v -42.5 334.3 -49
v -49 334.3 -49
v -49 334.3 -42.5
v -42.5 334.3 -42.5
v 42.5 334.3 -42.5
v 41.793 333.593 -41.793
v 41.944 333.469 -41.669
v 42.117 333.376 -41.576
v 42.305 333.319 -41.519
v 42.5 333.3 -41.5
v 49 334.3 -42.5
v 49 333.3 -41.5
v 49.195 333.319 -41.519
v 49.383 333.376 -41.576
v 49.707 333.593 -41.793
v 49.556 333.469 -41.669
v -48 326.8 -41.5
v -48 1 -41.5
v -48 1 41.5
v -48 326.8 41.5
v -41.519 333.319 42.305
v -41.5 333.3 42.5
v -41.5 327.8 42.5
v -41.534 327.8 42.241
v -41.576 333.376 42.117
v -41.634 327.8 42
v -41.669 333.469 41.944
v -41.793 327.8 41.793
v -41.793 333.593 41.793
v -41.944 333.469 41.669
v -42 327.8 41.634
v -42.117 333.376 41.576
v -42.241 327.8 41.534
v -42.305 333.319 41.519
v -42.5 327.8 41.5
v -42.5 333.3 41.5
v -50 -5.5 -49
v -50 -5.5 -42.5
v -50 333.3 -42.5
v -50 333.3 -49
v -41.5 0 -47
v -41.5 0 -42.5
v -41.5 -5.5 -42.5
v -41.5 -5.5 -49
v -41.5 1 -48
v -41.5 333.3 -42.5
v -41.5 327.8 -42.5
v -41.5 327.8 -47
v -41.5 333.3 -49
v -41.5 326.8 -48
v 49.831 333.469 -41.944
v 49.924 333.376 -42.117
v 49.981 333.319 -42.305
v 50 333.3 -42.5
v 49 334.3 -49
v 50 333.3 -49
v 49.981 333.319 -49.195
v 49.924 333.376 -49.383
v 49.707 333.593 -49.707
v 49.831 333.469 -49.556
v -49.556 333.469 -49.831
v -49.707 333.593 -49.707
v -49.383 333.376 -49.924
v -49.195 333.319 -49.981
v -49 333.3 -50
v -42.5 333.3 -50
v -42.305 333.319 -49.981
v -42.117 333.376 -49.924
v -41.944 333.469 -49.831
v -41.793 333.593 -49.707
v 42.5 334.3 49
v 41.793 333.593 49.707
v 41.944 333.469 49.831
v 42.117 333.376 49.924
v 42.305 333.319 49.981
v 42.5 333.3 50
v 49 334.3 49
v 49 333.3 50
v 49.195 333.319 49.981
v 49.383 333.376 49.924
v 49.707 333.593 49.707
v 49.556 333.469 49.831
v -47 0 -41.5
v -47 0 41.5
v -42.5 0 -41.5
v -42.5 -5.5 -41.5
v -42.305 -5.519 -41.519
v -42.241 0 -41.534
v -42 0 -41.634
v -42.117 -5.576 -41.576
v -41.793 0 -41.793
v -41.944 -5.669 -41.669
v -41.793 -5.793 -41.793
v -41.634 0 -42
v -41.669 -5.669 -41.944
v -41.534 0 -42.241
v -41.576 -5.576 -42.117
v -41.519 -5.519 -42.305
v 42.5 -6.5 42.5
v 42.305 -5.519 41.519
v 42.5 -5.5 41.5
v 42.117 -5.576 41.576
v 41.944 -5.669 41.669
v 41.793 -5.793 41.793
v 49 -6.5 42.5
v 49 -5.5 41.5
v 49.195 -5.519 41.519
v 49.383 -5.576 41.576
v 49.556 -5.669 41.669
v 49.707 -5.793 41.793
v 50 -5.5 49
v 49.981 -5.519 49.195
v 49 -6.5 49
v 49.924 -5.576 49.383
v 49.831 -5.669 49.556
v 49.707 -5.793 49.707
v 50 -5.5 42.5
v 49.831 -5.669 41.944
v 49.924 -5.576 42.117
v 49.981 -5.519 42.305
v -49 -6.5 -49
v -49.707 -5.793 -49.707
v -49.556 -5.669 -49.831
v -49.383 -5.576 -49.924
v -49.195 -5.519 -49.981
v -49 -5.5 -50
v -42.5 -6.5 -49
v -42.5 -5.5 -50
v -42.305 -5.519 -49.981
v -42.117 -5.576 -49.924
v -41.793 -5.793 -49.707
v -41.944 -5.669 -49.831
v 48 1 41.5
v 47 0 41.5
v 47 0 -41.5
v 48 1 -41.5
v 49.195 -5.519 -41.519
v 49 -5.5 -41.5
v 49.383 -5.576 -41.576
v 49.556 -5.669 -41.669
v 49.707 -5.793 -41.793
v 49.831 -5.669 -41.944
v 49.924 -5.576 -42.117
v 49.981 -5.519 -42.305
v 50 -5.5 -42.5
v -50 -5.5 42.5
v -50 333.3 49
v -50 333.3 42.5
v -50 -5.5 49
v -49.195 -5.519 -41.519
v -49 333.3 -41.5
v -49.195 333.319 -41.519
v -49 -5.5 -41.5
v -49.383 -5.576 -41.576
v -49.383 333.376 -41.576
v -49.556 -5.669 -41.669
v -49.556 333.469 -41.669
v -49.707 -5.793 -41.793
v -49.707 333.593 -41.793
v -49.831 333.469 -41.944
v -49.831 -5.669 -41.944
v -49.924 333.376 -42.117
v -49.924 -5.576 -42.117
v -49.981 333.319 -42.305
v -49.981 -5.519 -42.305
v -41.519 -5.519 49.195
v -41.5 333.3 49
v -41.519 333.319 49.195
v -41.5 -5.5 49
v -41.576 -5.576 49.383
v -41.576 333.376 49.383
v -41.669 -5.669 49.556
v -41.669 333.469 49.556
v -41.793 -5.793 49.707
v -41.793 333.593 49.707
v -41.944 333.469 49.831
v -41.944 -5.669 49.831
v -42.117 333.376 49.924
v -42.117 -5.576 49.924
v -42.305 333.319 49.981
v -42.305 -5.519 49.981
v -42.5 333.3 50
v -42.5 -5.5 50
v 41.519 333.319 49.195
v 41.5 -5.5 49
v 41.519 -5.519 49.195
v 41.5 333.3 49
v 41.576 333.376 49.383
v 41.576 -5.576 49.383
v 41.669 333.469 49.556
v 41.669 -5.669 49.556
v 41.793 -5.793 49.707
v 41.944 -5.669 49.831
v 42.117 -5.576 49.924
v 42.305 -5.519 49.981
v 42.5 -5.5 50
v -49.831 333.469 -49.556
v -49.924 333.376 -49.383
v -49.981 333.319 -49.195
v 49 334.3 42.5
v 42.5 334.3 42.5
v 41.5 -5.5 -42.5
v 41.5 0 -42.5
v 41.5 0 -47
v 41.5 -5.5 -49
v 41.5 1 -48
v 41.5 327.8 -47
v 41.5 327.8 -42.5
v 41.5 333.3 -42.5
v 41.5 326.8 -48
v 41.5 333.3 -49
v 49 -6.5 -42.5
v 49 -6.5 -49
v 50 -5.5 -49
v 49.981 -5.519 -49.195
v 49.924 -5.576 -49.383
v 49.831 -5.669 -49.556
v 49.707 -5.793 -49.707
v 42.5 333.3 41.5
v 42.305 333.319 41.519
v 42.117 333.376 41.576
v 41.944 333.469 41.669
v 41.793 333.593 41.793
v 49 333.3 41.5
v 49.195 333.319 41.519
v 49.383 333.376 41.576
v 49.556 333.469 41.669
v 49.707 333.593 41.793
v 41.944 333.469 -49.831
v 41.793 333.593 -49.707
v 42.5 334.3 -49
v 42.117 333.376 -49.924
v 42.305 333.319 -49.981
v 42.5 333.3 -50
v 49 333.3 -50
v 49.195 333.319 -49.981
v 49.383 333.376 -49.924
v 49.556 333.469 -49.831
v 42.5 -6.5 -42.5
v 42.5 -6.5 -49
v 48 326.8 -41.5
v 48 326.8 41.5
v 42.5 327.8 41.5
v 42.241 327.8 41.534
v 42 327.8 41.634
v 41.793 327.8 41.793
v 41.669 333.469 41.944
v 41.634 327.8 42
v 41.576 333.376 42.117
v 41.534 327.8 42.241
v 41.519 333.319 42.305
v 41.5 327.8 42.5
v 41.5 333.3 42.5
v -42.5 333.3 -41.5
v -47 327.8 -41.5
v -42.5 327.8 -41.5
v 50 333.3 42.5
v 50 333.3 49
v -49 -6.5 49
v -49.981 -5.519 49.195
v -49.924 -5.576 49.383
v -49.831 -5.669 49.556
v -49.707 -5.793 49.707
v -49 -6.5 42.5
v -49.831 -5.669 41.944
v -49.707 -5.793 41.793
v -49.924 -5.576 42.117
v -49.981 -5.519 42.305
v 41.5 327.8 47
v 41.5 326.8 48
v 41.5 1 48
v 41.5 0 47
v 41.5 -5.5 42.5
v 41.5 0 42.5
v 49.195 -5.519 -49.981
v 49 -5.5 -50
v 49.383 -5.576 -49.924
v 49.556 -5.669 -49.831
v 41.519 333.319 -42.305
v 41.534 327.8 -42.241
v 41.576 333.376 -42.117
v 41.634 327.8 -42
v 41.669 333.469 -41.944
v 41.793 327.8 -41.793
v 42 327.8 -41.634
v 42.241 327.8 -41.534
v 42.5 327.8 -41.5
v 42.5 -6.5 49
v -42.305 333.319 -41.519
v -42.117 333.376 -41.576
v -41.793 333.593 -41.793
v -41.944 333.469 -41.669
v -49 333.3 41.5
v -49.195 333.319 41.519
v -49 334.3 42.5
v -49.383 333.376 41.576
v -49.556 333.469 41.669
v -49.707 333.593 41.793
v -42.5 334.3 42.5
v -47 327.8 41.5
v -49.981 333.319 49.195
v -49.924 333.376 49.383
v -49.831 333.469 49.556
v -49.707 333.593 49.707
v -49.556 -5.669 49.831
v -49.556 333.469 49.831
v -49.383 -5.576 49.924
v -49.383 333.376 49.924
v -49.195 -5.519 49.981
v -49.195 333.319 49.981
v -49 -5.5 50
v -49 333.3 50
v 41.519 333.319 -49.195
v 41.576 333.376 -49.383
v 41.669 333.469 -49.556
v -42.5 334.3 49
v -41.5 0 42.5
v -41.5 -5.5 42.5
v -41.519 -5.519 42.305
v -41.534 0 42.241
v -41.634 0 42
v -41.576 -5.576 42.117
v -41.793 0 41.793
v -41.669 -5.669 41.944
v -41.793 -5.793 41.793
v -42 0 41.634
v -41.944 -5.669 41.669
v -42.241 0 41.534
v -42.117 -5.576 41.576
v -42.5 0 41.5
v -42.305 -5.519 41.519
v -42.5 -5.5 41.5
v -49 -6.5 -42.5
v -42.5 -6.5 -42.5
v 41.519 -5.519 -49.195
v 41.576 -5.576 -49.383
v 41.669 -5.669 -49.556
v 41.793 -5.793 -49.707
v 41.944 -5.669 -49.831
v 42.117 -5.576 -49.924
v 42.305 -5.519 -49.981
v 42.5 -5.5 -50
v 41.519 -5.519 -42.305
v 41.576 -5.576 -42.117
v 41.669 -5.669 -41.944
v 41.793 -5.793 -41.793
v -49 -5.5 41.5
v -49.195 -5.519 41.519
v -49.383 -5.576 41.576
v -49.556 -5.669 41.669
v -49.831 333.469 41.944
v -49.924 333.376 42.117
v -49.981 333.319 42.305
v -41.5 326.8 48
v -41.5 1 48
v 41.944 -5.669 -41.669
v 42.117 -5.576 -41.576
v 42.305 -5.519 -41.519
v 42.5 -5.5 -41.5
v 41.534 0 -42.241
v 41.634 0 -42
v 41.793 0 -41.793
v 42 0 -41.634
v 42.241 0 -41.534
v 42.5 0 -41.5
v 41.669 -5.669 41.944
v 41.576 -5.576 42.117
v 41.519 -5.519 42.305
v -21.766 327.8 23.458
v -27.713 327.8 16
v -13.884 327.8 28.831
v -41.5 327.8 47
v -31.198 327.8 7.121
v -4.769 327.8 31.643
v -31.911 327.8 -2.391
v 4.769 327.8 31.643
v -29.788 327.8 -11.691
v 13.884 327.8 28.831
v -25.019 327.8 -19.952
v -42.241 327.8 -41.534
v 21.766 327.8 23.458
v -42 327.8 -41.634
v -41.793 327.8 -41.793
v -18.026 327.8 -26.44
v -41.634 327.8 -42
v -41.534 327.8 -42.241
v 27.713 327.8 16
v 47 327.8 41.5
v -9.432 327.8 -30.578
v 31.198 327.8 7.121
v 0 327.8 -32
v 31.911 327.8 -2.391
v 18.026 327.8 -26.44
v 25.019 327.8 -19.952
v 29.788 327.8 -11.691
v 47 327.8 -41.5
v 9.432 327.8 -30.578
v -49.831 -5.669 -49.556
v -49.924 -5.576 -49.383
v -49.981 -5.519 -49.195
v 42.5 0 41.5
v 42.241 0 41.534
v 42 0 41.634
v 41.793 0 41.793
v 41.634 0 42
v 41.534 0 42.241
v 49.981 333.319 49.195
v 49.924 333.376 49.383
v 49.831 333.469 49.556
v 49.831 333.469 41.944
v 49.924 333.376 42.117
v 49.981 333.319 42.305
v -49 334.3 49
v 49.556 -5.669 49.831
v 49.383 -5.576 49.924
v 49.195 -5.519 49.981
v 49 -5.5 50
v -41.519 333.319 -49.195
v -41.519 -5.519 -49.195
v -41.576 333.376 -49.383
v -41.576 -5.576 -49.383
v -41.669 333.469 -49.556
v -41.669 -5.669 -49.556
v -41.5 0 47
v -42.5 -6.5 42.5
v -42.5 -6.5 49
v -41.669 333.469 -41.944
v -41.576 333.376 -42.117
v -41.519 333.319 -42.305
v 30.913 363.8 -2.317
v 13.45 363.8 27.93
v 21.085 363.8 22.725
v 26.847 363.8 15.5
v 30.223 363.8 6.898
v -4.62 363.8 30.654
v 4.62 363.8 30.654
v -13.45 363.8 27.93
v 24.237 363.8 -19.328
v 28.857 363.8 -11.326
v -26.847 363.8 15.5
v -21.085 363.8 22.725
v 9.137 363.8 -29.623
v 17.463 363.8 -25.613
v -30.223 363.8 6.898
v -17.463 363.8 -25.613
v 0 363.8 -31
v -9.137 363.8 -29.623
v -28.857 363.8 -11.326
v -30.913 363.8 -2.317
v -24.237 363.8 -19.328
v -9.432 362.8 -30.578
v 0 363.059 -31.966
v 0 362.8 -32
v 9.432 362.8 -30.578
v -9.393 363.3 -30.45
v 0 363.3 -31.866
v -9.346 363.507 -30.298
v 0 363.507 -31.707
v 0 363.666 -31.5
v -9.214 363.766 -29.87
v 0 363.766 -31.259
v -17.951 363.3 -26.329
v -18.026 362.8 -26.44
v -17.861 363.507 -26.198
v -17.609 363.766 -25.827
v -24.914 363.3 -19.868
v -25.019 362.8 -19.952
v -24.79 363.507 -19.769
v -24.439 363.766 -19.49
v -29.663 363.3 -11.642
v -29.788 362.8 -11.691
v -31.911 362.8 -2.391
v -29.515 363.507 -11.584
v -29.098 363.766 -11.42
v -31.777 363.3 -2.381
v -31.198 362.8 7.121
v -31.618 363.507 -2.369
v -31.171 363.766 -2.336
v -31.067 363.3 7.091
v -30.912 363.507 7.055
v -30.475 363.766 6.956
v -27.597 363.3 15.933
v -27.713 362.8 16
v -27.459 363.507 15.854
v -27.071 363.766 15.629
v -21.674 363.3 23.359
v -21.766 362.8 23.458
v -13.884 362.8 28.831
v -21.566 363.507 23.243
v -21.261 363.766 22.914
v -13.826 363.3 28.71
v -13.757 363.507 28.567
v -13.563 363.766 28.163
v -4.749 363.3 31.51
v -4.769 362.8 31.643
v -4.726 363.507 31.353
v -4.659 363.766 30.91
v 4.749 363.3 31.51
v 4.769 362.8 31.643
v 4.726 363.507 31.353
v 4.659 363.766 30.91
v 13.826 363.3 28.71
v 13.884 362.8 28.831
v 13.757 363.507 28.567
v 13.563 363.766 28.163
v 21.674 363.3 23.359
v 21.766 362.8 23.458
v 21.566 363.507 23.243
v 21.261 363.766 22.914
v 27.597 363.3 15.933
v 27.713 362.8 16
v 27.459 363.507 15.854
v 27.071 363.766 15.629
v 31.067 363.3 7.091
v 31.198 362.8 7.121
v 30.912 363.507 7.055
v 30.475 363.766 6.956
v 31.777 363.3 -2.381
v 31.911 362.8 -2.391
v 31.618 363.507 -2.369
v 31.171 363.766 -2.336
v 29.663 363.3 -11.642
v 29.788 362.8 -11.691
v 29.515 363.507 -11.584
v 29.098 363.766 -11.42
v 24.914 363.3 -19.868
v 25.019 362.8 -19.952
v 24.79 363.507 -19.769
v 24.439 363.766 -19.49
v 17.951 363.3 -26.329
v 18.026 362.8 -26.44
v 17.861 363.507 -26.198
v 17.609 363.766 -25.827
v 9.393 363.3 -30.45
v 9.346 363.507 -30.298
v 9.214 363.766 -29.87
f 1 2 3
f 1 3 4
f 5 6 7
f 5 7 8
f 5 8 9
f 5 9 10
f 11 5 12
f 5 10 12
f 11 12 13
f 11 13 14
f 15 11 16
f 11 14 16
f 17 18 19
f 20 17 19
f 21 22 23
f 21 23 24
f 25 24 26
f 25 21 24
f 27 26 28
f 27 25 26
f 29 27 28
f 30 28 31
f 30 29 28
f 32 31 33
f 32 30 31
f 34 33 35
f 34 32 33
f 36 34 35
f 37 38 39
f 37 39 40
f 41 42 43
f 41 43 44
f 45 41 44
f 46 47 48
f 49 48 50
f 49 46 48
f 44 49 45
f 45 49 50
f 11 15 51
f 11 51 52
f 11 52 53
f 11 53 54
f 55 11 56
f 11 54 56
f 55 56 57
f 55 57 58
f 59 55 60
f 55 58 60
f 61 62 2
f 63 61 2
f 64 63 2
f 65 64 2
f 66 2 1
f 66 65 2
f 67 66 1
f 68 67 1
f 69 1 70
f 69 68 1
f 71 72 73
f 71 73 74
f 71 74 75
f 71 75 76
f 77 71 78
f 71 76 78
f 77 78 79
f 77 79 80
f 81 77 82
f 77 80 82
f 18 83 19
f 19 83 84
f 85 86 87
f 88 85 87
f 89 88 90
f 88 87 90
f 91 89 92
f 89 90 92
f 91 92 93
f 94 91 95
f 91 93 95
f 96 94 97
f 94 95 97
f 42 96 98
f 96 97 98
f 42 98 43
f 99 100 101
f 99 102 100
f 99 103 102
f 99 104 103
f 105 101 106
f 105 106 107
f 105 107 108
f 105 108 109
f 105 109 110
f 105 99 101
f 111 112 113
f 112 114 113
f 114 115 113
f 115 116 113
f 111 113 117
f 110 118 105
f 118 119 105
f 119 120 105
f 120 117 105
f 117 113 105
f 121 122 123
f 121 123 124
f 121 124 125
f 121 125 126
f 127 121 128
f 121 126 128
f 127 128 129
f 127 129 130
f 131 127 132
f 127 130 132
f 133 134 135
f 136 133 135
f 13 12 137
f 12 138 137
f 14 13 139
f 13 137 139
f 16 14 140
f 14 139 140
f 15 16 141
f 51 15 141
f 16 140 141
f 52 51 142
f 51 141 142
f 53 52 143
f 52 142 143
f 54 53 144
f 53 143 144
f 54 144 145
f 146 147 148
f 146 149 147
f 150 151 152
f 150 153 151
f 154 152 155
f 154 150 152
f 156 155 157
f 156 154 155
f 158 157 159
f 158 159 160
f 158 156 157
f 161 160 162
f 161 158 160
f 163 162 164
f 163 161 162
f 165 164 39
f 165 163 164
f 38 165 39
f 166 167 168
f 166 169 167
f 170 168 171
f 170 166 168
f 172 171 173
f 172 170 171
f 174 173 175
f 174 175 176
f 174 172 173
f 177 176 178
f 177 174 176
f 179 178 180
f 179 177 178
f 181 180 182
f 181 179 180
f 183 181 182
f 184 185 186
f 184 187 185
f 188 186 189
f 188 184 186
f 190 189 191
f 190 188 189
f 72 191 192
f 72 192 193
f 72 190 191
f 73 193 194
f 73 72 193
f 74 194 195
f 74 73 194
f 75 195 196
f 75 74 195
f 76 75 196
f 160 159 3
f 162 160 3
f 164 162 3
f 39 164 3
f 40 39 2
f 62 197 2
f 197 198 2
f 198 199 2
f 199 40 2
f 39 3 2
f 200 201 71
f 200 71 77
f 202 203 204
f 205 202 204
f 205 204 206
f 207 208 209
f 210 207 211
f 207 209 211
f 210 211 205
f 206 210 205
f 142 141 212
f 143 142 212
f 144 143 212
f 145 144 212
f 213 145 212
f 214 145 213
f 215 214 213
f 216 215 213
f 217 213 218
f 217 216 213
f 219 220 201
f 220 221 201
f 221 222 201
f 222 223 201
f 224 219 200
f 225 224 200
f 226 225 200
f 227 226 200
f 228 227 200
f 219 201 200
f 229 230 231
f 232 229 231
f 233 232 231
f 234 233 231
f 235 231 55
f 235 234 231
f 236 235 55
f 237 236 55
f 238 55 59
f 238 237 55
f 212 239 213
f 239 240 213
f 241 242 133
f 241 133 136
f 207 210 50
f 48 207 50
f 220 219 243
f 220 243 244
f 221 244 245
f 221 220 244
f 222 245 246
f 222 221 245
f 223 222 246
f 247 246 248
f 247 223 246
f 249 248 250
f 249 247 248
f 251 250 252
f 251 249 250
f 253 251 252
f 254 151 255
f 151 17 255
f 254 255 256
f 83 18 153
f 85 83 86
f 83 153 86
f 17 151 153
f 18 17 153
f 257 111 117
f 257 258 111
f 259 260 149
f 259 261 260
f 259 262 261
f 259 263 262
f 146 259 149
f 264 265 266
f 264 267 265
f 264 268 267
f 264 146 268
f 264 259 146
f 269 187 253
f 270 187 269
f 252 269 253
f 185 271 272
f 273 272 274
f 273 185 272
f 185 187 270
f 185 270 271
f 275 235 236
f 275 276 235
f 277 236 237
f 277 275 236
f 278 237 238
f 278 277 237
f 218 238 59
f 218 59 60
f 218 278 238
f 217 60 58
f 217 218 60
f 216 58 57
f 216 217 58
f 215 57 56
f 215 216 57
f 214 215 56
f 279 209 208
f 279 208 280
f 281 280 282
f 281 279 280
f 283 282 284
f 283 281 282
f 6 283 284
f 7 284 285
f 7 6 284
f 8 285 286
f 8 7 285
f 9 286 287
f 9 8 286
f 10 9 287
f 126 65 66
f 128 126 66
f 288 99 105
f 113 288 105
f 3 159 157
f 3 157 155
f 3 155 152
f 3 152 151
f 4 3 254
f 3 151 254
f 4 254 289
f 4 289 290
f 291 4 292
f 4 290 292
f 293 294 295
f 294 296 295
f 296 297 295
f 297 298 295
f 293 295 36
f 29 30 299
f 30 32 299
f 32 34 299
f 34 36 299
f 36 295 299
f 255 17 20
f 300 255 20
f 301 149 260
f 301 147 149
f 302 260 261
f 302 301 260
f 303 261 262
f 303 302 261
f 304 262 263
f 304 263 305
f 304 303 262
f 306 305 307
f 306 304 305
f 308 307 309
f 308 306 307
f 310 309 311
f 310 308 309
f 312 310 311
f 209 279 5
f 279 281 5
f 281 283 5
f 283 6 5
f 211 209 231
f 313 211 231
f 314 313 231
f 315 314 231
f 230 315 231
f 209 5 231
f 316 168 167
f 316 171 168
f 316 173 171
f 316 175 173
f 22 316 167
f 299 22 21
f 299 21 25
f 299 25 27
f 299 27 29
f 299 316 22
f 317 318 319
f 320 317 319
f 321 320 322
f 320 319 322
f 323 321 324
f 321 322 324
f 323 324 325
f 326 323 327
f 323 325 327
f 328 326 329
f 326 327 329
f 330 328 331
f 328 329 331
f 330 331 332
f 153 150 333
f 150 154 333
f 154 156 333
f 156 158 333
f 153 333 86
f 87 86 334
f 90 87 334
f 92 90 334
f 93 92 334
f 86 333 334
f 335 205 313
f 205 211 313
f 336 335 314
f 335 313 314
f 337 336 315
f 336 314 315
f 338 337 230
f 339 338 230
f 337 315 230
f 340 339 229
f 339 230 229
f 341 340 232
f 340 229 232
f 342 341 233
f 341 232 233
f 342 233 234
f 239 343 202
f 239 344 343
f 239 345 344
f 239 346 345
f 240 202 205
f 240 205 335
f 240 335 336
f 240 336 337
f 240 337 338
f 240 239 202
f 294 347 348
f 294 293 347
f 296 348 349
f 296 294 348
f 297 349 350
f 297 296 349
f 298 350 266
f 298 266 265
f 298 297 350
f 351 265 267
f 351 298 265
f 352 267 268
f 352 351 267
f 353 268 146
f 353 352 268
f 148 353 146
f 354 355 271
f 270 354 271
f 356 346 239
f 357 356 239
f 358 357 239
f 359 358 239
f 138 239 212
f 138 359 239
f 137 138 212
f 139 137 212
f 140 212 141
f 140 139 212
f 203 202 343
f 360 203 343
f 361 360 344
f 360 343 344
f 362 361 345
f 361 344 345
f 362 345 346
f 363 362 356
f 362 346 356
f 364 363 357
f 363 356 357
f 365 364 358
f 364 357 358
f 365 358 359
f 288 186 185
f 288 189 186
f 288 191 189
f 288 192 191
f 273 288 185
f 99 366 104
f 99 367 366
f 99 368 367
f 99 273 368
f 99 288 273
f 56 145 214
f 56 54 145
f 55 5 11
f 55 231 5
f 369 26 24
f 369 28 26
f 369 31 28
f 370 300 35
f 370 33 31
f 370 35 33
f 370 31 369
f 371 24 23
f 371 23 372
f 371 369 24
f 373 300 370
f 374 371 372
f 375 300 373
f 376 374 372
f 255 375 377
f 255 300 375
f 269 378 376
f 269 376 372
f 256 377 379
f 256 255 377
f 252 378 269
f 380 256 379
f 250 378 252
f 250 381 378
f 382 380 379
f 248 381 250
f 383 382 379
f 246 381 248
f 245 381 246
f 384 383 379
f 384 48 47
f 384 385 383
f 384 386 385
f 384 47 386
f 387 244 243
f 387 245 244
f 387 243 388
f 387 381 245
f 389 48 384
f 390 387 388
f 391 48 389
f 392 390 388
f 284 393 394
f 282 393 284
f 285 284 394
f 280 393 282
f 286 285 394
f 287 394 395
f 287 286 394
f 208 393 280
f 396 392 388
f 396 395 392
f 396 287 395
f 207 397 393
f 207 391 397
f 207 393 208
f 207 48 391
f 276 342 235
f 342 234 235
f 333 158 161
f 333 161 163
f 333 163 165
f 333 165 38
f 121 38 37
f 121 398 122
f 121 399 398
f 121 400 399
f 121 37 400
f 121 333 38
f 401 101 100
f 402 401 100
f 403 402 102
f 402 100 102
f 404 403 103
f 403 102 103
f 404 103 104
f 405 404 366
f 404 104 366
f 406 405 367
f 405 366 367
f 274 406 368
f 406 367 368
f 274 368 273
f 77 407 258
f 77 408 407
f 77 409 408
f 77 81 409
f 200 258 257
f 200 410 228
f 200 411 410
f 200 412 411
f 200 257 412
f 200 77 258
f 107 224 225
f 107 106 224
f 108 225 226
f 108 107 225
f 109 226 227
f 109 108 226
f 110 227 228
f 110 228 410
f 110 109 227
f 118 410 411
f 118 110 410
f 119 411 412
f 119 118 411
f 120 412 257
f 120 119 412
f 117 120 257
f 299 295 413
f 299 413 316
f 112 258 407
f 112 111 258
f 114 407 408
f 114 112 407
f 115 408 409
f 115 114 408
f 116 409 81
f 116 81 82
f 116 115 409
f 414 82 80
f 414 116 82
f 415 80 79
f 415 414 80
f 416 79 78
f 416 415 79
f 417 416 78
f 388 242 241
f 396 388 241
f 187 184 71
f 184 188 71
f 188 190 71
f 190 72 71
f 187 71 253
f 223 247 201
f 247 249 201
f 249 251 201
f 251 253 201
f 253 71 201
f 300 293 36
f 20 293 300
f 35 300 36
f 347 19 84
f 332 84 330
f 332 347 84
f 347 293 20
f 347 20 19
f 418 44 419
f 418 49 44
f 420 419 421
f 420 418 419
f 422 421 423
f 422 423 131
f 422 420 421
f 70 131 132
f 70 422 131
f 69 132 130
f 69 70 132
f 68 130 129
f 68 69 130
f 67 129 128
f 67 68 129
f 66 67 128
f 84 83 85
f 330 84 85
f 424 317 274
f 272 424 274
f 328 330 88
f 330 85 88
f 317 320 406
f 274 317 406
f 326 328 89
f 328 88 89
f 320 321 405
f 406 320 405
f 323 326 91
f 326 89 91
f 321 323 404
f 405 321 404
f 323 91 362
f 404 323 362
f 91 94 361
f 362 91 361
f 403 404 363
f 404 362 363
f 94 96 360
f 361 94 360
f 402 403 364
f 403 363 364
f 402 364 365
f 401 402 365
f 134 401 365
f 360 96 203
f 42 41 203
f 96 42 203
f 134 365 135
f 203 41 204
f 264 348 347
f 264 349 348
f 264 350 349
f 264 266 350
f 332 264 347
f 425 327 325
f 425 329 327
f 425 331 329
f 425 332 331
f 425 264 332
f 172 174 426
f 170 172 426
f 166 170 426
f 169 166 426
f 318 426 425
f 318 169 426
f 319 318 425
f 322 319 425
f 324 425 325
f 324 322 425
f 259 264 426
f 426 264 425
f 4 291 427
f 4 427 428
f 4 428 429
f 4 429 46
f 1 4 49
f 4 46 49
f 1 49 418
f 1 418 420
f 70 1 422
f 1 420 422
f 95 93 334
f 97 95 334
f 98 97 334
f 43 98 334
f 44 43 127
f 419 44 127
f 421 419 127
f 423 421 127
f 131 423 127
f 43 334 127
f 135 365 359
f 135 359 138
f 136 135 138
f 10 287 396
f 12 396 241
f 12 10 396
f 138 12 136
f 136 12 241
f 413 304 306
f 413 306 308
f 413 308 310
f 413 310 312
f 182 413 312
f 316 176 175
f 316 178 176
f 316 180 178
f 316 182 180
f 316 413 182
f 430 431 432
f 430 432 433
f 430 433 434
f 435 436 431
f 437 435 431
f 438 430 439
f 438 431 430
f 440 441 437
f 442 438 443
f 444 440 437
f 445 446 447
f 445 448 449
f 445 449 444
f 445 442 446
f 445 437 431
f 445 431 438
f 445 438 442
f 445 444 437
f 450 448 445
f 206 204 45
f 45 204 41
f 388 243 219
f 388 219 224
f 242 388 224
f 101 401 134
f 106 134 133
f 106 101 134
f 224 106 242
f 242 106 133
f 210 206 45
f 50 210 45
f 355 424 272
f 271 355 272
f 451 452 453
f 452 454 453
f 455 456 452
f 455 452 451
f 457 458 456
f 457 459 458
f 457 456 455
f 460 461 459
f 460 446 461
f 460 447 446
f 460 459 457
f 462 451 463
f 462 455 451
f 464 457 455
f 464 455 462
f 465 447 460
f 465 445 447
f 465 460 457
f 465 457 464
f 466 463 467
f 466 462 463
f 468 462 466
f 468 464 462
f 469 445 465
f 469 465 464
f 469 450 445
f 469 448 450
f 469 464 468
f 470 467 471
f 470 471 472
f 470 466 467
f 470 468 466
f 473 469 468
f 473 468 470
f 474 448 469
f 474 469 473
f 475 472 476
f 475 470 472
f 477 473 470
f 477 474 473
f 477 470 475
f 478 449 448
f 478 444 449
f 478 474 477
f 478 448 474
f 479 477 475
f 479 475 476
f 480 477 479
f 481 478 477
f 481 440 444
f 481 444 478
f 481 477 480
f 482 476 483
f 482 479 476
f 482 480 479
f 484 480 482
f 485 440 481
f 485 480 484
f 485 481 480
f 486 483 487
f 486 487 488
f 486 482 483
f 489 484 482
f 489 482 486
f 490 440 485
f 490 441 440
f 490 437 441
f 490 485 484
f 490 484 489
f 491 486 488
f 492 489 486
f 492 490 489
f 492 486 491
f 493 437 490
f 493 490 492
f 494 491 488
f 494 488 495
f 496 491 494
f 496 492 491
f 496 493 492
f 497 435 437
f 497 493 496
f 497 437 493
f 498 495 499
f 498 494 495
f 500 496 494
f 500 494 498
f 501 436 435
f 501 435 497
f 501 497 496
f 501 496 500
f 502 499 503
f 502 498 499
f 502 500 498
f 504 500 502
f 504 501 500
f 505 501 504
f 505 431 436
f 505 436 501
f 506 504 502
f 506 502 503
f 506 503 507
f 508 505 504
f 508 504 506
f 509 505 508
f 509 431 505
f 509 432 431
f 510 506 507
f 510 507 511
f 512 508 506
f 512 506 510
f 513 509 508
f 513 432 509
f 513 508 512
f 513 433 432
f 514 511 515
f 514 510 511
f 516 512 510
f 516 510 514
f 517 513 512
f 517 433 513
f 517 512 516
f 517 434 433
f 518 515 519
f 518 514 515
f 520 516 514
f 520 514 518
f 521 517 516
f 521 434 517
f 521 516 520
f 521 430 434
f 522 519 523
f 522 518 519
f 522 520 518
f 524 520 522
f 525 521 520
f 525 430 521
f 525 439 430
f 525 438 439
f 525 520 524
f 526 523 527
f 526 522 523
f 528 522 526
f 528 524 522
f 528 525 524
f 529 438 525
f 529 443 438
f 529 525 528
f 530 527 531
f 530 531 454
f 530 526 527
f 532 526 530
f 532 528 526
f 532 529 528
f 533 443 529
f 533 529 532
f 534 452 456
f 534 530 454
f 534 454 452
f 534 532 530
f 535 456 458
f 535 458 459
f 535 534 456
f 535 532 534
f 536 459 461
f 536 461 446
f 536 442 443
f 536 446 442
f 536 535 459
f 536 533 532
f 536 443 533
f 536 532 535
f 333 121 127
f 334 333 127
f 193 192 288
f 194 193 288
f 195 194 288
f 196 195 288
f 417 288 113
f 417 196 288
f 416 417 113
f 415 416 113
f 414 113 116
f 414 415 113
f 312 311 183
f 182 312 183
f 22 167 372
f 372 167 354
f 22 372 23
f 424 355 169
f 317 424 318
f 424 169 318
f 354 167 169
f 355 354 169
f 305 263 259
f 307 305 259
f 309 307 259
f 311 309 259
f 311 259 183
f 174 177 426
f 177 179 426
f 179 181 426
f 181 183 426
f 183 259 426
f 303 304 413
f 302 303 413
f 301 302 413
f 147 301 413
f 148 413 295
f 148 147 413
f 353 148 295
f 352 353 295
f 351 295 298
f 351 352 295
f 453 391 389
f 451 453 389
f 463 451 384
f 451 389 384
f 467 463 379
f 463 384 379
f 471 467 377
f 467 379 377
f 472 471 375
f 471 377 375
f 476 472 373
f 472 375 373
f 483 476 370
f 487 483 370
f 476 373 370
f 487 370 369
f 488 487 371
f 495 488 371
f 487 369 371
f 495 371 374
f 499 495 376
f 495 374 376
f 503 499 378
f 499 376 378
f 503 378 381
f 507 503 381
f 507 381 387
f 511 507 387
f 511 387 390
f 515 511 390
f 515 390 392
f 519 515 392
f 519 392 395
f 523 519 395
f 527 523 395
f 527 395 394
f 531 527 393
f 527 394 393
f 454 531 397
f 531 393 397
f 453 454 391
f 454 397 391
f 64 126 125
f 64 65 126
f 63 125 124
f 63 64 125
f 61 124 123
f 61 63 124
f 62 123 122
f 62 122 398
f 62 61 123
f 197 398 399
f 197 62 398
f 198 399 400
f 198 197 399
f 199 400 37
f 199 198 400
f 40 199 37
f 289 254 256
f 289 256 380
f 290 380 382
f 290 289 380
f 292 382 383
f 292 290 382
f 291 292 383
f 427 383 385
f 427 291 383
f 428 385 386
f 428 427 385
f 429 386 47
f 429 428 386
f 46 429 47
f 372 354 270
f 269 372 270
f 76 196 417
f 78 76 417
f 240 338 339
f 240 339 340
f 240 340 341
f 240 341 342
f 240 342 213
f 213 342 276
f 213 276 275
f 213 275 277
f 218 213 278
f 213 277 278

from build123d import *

# Parameters (mm, degrees)
SKETCH1_W                = 100
SKETCH1_H                = 100
BOSS_EXTRUDE1_DEPTH      = 327.8
SKETCH2_W                = 8.5
SKETCH2_H                = 8.5
BOSS_EXTRUDE2_DEPTH      = 6.5
CHAMFER1_SIZE            = 1
SKETCH3_R                = 32
BOSS_EXTRUDE3_DEPTH      = 36
CHAMFER1_OF_MIRROR1_SIZE = 1
FILLET1_R                = 1
SKETCH6_W                = 83
SKETCH6_H                = 327.8
CUT_EXTRUDE1_DEPTH       = 2
CIRPATTERN1_COUNT        = 4
FILLET2_R                = 1
FILLET3_R                = 1
CHAMFER2_SIZE            = 1


with BuildPart() as part:
    # Sketch1 → Boss-Extrude1 (new body)
    with BuildSketch(Plane(origin=(0, 0, 0), x_dir=(1, 0, 0), z_dir=(0, 1, 0))):
        Rectangle(SKETCH1_W, SKETCH1_H)
    extrude(amount=BOSS_EXTRUDE1_DEPTH)

    # Sketch2 → Boss-Extrude2 (add)
    with BuildSketch(Plane(origin=(0, 327.8, 0), x_dir=(1, 0, 0), z_dir=(0, 1, 0))):
        with Locations((45.75, 45.75)):
            Rectangle(SKETCH2_W, SKETCH2_H)
        with Locations((-45.75, 45.75)):
            Rectangle(SKETCH2_W, SKETCH2_H)
        with Locations((45.75, -45.75)):
            Rectangle(SKETCH2_W, SKETCH2_H)
        with Locations((-45.75, -45.75)):
            Rectangle(SKETCH2_W, SKETCH2_H)
    boss_extrude2 = extrude(amount=BOSS_EXTRUDE2_DEPTH)

    # Chamfer1
    chamfer1_edges = [part.edges().sort_by_distance(p)[0] for p in [
        (45.75, 334.3, -41.5),
        (41.5, 334.3, -45.75),
        (45.75, 334.3, -50),
        (50, 334.3, -45.75),
        (41.5, 334.3, 45.75),
        (45.75, 334.3, 41.5),
        (50, 334.3, 45.75),
        (45.75, 334.3, 50),
        (-50, 334.3, 45.75),
        (-45.75, 334.3, 41.5),
        (-41.5, 334.3, 45.75),
        (-45.75, 334.3, 50),
        (-45.75, 334.3, -50),
        (-41.5, 334.3, -45.75),
        (-45.75, 334.3, -41.5),
        (-50, 334.3, -45.75),
    ]]
    chamfer(chamfer1_edges, length=CHAMFER1_SIZE)

    # Sketch3 → Boss-Extrude3 (add)
    with BuildSketch(Plane(origin=(0, 327.8, 0), x_dir=(1, 0, 0), z_dir=(0, 1, 0))):
        with Locations(Location((0, 0, 0), (0, 0, 90))):
            Circle(SKETCH3_R)
    extrude(amount=BOSS_EXTRUDE3_DEPTH)

    # Mirror1: Boss-Extrude2 across plane
    add(boss_extrude2.mirror(Plane.ZX.offset(163.9)))

    # Chamfer1 of Mirror1
    chamfer1_of_mirror1_edges = [part.edges().sort_by_distance(p)[0] for p in [
        (45.75, -6.5, -41.5),
        (41.5, -6.5, -45.75),
        (45.75, -6.5, -50),
        (50, -6.5, -45.75),
        (41.5, -6.5, 45.75),
        (45.75, -6.5, 41.5),
        (50, -6.5, 45.75),
        (45.75, -6.5, 50),
        (-50, -6.5, 45.75),
        (-45.75, -6.5, 41.5),
        (-41.5, -6.5, 45.75),
        (-45.75, -6.5, 50),
        (-45.75, -6.5, -50),
        (-41.5, -6.5, -45.75),
        (-45.75, -6.5, -41.5),
        (-50, -6.5, -45.75),
    ]]
    chamfer(chamfer1_of_mirror1_edges, length=CHAMFER1_OF_MIRROR1_SIZE)

    # Fillet1
    fillet1_edges = [part.edges().sort_by_distance(p)[0] for p in [
        (-50, 163.9, -50),
        (50, 163.9, -50),
        (50, 163.9, 50),
        (-50, 163.9, 50),
    ]]
    fillet(fillet1_edges, radius=FILLET1_R)

    # Sketch6 → Cut-Extrude1 (cut)
    with BuildSketch(Plane(origin=(0, 0, -50), x_dir=(-1, 0, 0), z_dir=(0, 0, -1))):
        with Locations((0, 163.9)):
            Rectangle(SKETCH6_W, SKETCH6_H)
    cut_extrude1 = extrude(amount=-CUT_EXTRUDE1_DEPTH, mode=Mode.SUBTRACT)

    # CirPattern1: Cut-Extrude1 ×4 about axis
    cirpattern1_axis = Axis((0, 0, 0), (0, 1, 0))
    for i in range(1, CIRPATTERN1_COUNT):
        add(cut_extrude1.rotate(cirpattern1_axis, i * 360 / CIRPATTERN1_COUNT), mode=Mode.SUBTRACT)

    # Fillet2
    fillet2_edges = [part.edges().sort_by_distance(p)[0] for p in [
        (0, 363.8, 32),
    ]]
    fillet(fillet2_edges, radius=FILLET2_R)

    # Fillet3
    fillet3_edges = [part.edges().sort_by_distance(p)[0] for p in [
        (41.5, -2.75, -41.5),
        (41.5, -2.75, 41.5),
        (-41.5, -2.75, 41.5),
        (-41.5, -2.75, -41.5),
        (50, 163.9, -41.5),
        (41.5, 330.55, -41.5),
        (41.5, 163.9, -50),
        (-41.5, 163.9, -50),
        (50, 163.9, 41.5),
        (41.5, 163.9, 50),
        (41.5, 330.55, 41.5),
        (-41.5, 163.9, 50),
        (-50, 163.9, 41.5),
        (-50, 163.9, -41.5),
        (-41.5, 330.55, 41.5),
        (-41.5, 330.55, -41.5),
    ]]
    fillet(fillet3_edges, radius=FILLET3_R)

    # Chamfer2
    chamfer2_edges = [part.edges().sort_by_distance(p)[0] for p in [
        (48, 0, 0),
        (0, 0, 48),
        (0, 0, -48),
        (-48, 0, 0),
        (48, 327.8, 0),
        (0, 327.8, -48),
        (0, 327.8, 48),
        (-48, 327.8, 0),
    ]]
    chamfer(chamfer2_edges, length=CHAMFER2_SIZE)


solid = part.part
